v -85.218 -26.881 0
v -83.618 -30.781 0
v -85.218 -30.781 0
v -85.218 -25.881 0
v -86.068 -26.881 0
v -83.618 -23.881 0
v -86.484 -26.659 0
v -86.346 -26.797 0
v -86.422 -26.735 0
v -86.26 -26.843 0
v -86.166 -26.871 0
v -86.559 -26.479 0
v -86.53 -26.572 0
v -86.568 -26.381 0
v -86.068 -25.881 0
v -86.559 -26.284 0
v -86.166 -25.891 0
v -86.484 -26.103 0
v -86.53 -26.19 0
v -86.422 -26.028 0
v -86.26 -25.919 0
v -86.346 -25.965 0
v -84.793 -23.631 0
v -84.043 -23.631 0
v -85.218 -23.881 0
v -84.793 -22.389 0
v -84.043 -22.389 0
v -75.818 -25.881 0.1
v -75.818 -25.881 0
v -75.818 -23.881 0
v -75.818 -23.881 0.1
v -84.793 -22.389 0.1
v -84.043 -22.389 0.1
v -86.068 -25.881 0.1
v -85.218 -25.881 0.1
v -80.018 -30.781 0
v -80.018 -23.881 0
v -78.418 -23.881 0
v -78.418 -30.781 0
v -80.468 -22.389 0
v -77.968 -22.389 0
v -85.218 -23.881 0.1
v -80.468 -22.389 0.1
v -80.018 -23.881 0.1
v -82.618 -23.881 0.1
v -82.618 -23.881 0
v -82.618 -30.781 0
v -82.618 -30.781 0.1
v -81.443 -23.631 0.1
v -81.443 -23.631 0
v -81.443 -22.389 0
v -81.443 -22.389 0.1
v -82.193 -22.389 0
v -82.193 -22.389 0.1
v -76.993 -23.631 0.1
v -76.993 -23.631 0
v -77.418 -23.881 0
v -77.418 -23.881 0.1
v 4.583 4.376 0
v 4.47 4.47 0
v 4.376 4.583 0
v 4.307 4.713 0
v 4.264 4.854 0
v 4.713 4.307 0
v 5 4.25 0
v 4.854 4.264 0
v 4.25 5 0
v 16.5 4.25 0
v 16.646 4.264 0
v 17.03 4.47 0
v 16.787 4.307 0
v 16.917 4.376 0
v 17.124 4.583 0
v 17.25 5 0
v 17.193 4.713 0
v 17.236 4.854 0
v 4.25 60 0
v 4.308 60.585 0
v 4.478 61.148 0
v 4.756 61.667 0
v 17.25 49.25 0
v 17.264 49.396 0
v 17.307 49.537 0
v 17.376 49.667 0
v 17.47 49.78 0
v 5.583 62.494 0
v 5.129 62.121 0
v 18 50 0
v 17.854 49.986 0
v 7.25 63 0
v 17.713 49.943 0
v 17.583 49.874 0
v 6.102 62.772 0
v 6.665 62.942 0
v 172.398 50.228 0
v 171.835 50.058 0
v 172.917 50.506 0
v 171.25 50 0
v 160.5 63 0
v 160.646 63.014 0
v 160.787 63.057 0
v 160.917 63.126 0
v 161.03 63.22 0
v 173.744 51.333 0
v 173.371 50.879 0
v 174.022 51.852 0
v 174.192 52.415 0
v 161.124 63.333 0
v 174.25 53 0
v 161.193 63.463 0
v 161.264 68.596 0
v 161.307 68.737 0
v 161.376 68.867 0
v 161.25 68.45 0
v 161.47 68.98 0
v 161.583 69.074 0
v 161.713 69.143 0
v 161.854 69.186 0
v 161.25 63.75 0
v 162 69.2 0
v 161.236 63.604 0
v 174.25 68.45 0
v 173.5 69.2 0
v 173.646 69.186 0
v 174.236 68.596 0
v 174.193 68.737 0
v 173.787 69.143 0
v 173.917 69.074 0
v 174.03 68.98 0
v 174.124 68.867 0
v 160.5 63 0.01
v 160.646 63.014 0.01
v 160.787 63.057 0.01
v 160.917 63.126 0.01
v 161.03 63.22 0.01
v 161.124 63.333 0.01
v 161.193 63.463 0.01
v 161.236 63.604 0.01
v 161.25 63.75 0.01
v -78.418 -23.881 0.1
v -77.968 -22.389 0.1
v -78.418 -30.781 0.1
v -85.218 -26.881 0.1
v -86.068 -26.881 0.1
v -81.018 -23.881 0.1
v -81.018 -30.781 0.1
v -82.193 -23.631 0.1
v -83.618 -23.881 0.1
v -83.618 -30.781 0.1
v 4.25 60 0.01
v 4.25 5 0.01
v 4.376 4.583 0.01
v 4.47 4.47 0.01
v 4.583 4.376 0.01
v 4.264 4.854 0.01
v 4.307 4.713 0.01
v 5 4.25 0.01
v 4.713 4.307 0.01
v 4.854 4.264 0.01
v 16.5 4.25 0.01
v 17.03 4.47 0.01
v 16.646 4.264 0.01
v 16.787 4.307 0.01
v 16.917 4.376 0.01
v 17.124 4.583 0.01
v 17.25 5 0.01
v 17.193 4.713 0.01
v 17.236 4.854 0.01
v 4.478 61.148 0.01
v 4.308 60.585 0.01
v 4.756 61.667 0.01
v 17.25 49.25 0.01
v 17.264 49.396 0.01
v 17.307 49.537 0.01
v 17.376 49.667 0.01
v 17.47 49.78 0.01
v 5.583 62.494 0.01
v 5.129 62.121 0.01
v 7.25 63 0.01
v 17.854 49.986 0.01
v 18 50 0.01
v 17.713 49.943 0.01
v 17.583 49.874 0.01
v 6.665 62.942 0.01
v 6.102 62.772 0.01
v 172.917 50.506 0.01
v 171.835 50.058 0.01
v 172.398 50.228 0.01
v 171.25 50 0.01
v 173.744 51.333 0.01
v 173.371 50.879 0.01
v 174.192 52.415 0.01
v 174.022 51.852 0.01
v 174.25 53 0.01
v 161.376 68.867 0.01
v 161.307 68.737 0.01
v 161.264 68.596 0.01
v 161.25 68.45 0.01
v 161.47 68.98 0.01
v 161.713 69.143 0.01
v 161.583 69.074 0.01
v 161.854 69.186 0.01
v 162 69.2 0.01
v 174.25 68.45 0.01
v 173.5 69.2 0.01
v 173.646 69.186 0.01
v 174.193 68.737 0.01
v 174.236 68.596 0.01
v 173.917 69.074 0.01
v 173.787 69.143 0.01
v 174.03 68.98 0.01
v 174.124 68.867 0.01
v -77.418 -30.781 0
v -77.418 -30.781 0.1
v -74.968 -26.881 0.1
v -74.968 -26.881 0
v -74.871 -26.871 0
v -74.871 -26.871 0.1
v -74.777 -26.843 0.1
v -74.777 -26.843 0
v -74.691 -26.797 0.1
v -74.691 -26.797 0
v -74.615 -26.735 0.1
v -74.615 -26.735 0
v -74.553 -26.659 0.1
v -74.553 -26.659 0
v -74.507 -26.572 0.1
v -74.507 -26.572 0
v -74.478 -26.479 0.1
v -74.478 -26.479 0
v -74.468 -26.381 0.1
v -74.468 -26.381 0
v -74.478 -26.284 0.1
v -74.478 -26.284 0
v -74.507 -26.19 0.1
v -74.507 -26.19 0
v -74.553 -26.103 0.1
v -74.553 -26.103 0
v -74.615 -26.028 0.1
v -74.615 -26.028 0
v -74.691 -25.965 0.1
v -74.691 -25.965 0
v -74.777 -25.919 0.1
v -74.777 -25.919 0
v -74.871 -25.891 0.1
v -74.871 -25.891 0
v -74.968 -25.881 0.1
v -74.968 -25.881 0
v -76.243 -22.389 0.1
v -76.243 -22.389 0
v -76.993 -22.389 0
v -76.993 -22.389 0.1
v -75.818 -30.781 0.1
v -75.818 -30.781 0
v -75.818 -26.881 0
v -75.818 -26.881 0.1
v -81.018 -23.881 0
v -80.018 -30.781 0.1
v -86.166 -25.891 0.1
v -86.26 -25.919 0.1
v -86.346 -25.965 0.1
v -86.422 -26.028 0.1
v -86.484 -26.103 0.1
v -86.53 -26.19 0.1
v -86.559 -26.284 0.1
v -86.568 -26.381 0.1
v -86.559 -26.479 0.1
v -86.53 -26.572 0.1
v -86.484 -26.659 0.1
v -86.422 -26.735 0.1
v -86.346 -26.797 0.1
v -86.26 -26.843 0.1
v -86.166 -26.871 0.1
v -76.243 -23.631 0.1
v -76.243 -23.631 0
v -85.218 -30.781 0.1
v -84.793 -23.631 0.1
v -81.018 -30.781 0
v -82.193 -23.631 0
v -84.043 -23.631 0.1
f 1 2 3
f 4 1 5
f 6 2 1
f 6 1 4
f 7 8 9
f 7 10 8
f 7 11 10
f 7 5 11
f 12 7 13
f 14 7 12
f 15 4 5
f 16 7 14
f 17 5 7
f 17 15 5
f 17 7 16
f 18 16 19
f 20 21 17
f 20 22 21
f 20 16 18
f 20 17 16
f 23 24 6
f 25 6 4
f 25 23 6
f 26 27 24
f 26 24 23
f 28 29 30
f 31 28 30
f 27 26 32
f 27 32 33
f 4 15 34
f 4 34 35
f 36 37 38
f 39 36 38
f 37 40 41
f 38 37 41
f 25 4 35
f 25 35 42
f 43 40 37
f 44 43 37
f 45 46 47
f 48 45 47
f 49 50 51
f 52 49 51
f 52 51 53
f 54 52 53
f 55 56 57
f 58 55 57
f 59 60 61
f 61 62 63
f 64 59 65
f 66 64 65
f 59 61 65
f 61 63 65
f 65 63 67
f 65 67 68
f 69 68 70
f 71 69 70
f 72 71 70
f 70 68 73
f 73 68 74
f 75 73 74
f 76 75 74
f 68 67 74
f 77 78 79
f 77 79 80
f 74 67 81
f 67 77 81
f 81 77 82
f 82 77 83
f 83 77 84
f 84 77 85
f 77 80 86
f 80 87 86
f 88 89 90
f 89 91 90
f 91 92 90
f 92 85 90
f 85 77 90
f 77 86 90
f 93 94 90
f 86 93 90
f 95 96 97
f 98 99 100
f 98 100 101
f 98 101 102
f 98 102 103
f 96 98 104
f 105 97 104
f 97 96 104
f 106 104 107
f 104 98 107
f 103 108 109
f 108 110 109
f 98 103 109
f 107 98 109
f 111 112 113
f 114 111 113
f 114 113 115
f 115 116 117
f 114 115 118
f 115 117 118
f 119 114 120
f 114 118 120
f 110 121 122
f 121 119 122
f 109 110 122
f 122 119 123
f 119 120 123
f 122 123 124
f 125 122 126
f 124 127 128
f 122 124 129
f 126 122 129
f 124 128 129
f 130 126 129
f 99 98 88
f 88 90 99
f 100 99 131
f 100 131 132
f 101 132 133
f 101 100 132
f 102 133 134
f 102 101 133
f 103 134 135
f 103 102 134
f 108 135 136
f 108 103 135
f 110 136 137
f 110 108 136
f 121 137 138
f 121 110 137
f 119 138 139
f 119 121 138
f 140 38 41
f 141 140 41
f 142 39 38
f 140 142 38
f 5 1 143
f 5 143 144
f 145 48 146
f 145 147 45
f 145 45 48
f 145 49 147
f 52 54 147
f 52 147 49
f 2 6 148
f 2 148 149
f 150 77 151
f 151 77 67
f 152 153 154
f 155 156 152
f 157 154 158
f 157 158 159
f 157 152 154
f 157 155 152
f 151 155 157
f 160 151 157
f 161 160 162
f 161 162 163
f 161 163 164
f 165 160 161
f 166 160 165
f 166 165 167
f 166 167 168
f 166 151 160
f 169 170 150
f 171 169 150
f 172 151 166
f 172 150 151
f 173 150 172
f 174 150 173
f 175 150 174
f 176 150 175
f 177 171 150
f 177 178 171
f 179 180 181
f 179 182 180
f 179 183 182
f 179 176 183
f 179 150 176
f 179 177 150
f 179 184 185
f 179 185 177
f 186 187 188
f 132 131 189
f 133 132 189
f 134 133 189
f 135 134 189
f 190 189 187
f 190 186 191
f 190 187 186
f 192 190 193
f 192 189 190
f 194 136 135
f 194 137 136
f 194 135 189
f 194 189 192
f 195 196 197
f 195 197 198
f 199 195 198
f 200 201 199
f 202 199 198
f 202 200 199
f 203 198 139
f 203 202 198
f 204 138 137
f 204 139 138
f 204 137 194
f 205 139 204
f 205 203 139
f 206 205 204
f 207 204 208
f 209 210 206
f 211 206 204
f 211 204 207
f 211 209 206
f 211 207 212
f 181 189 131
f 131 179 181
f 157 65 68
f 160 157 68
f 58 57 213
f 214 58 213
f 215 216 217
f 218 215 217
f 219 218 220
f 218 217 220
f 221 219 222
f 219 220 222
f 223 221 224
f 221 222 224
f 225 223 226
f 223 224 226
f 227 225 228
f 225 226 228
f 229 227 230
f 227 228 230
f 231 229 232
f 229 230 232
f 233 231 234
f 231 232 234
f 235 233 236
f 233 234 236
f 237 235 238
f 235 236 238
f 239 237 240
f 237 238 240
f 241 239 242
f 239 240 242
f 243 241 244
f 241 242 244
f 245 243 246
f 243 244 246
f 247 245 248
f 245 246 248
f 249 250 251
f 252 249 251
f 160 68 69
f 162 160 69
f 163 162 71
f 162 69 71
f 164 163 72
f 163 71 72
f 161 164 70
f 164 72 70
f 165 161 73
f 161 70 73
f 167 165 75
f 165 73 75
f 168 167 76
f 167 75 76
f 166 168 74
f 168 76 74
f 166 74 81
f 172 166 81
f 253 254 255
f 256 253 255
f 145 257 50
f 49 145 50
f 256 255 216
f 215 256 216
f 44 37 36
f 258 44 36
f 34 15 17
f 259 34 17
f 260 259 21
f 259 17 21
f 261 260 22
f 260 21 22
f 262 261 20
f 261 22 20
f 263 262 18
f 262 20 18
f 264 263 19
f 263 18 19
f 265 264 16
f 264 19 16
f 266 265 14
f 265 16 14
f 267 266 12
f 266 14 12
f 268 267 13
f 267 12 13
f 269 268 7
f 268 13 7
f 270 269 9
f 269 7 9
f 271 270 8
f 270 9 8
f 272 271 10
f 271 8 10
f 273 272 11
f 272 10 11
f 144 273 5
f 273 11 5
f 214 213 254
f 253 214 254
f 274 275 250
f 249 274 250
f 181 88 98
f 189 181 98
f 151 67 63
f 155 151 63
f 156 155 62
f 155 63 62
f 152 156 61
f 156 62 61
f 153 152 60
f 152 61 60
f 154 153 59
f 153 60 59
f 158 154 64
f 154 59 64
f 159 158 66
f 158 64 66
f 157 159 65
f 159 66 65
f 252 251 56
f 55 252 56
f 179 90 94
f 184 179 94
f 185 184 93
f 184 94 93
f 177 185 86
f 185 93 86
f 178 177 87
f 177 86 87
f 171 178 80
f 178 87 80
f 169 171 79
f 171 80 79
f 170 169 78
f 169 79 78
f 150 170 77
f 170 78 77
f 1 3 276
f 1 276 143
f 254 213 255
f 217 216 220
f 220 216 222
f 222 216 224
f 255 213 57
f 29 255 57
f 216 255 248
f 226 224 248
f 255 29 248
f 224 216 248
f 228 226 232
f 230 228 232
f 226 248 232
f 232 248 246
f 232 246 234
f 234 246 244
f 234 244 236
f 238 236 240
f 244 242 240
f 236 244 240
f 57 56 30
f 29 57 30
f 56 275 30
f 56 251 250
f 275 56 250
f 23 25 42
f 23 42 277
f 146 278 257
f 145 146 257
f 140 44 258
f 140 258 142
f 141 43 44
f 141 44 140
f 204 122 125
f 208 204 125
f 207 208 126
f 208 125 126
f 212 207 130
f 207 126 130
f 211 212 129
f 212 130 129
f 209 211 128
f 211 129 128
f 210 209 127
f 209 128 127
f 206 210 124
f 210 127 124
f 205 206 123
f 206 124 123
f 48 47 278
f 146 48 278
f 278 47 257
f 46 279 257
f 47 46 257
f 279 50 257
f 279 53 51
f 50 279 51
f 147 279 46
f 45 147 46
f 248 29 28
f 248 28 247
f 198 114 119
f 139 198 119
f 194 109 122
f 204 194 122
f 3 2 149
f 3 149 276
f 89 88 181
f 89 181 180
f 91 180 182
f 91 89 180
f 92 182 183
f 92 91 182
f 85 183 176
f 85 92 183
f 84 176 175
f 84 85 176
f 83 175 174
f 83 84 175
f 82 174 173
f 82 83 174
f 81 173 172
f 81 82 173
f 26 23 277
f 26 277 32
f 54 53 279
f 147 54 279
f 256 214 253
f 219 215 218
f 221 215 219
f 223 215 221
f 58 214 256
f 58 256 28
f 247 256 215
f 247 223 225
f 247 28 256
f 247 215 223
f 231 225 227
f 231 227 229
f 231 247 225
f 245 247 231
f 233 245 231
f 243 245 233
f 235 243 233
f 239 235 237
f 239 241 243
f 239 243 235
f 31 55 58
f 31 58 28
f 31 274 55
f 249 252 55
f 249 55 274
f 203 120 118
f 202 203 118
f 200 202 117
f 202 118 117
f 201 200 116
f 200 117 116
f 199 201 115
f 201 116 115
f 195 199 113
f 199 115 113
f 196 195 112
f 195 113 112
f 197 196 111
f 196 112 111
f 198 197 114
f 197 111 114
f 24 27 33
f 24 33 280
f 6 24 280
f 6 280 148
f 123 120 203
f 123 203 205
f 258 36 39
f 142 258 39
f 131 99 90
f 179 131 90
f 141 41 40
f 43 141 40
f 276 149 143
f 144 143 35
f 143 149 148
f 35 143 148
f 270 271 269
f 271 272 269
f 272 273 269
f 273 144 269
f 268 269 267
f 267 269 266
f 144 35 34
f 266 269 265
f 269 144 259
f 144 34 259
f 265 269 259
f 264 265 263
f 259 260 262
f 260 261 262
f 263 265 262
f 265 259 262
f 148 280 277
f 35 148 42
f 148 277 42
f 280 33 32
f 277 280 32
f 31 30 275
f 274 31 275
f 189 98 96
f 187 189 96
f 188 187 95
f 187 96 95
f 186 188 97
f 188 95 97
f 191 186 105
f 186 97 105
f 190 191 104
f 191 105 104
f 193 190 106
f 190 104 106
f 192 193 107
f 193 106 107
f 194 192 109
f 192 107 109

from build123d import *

# Parameters (mm, degrees)
PAD_DEPTH     = 0.01
EXTRUDE_DEPTH = 0.1


with BuildPart() as body:
    # Sketch → Pad (new body)
    with BuildSketch(Plane.XY):
        with BuildLine():
            Line((17.25, 5), (17.25, 49.25))
            ThreePointArc((18, 50), (17.46967, 49.78033), (17.25, 49.25))
            Line((18, 50), (171.25, 50))
            ThreePointArc((171.25, 50), (173.37132, 50.87868), (174.25, 53))
            Line((174.25, 53), (174.25, 68.45))
            ThreePointArc((174.25, 68.45), (174.03033, 68.98033), (173.5, 69.2))
            Line((162, 69.2), (173.5, 69.2))
            ThreePointArc((162, 69.2), (161.46967, 68.98033), (161.25, 68.45))
            Line((161.25, 68.45), (161.25, 63.75))
            ThreePointArc((160.5, 63), (161.03033, 63.21967), (161.25, 63.75))
            Line((160.5, 63), (7.25, 63))
            ThreePointArc((7.25, 63), (5.12868, 62.12132), (4.25, 60))
            Line((4.25, 60), (4.25, 5))
            ThreePointArc((4.25, 5), (4.46967, 4.46967), (5, 4.25))
            Line((5, 4.25), (16.5, 4.25))
            ThreePointArc((16.5, 4.25), (17.03033, 4.46967), (17.25, 5))
        make_face()
    extrude(amount=PAD_DEPTH)


with BuildPart() as extrude_body:
    # Sketch001 → Extrude (new body)
    with BuildSketch(Plane.XY):
        with BuildLine():
            Line((-85.218495, -23.88109), (-84.793495, -23.63109))
            Line((-84.793495, -23.63109), (-84.793495, -22.388941))
            Line((-84.793495, -22.388941), (-84.043495, -22.388941))
            Line((-84.043495, -22.388941), (-84.043495, -23.63109))
            Line((-84.043495, -23.63109), (-83.618495, -23.88109))
            Line((-83.618495, -23.88109), (-83.618495, -30.78109))
            Line((-83.618495, -30.78109), (-85.218495, -30.78109))
            Line((-85.218495, -30.78109), (-85.218495, -26.88109))
            Line((-85.218495, -26.88109), (-86.068495, -26.88109))
            ThreePointArc((-86.068495, -25.88109), (-86.568495, -26.38109), (-86.068495, -26.88109))
            Line((-86.068495, -25.88109), (-85.218495, -25.88109))
            Line((-85.218495, -25.88109), (-85.218495, -23.88109))
        make_face()
        with BuildLine():
            Line((-77.418495, -23.88109), (-77.418495, -30.78109))
            Line((-77.418495, -30.78109), (-75.818495, -30.78109))
            Line((-75.818495, -30.78109), (-75.818495, -26.88109))
            Line((-75.818495, -26.88109), (-74.968495, -26.88109))
            ThreePointArc((-74.968495, -26.88109), (-74.468495, -26.38109), (-74.968495, -25.88109))
            Line((-75.818495, -25.88109), (-74.968495, -25.88109))
            Line((-75.818495, -25.88109), (-75.818495, -23.88109))
            Line((-75.818495, -23.88109), (-76.243495, -23.63109))
            Line((-76.243495, -23.63109), (-76.243495, -22.388941))
            Line((-76.243495, -22.388941), (-76.993495, -22.388941))
            Line((-76.993495, -22.388941), (-76.993495, -23.63109))
            Line((-76.993495, -23.63109), (-77.418495, -23.88109))
        make_face()
        Polygon((-82.618495, -30.78109), (-81.018495, -30.78109), (-81.018495, -23.88109), (-81.443495, -23.63109), (-81.443495, -22.388941), (-82.193495, -22.388941), (-82.193495, -23.63109), (-82.618495, -23.88109), align=None)
        Polygon((-78.418495, -30.78109), (-78.418495, -23.88109), (-77.968495, -22.388941), (-80.468495, -22.388941), (-80.018495, -23.88109), (-80.018495, -30.78109), align=None)
    extrude(amount=EXTRUDE_DEPTH)


solid = Compound([body.part, extrude_body.part])
